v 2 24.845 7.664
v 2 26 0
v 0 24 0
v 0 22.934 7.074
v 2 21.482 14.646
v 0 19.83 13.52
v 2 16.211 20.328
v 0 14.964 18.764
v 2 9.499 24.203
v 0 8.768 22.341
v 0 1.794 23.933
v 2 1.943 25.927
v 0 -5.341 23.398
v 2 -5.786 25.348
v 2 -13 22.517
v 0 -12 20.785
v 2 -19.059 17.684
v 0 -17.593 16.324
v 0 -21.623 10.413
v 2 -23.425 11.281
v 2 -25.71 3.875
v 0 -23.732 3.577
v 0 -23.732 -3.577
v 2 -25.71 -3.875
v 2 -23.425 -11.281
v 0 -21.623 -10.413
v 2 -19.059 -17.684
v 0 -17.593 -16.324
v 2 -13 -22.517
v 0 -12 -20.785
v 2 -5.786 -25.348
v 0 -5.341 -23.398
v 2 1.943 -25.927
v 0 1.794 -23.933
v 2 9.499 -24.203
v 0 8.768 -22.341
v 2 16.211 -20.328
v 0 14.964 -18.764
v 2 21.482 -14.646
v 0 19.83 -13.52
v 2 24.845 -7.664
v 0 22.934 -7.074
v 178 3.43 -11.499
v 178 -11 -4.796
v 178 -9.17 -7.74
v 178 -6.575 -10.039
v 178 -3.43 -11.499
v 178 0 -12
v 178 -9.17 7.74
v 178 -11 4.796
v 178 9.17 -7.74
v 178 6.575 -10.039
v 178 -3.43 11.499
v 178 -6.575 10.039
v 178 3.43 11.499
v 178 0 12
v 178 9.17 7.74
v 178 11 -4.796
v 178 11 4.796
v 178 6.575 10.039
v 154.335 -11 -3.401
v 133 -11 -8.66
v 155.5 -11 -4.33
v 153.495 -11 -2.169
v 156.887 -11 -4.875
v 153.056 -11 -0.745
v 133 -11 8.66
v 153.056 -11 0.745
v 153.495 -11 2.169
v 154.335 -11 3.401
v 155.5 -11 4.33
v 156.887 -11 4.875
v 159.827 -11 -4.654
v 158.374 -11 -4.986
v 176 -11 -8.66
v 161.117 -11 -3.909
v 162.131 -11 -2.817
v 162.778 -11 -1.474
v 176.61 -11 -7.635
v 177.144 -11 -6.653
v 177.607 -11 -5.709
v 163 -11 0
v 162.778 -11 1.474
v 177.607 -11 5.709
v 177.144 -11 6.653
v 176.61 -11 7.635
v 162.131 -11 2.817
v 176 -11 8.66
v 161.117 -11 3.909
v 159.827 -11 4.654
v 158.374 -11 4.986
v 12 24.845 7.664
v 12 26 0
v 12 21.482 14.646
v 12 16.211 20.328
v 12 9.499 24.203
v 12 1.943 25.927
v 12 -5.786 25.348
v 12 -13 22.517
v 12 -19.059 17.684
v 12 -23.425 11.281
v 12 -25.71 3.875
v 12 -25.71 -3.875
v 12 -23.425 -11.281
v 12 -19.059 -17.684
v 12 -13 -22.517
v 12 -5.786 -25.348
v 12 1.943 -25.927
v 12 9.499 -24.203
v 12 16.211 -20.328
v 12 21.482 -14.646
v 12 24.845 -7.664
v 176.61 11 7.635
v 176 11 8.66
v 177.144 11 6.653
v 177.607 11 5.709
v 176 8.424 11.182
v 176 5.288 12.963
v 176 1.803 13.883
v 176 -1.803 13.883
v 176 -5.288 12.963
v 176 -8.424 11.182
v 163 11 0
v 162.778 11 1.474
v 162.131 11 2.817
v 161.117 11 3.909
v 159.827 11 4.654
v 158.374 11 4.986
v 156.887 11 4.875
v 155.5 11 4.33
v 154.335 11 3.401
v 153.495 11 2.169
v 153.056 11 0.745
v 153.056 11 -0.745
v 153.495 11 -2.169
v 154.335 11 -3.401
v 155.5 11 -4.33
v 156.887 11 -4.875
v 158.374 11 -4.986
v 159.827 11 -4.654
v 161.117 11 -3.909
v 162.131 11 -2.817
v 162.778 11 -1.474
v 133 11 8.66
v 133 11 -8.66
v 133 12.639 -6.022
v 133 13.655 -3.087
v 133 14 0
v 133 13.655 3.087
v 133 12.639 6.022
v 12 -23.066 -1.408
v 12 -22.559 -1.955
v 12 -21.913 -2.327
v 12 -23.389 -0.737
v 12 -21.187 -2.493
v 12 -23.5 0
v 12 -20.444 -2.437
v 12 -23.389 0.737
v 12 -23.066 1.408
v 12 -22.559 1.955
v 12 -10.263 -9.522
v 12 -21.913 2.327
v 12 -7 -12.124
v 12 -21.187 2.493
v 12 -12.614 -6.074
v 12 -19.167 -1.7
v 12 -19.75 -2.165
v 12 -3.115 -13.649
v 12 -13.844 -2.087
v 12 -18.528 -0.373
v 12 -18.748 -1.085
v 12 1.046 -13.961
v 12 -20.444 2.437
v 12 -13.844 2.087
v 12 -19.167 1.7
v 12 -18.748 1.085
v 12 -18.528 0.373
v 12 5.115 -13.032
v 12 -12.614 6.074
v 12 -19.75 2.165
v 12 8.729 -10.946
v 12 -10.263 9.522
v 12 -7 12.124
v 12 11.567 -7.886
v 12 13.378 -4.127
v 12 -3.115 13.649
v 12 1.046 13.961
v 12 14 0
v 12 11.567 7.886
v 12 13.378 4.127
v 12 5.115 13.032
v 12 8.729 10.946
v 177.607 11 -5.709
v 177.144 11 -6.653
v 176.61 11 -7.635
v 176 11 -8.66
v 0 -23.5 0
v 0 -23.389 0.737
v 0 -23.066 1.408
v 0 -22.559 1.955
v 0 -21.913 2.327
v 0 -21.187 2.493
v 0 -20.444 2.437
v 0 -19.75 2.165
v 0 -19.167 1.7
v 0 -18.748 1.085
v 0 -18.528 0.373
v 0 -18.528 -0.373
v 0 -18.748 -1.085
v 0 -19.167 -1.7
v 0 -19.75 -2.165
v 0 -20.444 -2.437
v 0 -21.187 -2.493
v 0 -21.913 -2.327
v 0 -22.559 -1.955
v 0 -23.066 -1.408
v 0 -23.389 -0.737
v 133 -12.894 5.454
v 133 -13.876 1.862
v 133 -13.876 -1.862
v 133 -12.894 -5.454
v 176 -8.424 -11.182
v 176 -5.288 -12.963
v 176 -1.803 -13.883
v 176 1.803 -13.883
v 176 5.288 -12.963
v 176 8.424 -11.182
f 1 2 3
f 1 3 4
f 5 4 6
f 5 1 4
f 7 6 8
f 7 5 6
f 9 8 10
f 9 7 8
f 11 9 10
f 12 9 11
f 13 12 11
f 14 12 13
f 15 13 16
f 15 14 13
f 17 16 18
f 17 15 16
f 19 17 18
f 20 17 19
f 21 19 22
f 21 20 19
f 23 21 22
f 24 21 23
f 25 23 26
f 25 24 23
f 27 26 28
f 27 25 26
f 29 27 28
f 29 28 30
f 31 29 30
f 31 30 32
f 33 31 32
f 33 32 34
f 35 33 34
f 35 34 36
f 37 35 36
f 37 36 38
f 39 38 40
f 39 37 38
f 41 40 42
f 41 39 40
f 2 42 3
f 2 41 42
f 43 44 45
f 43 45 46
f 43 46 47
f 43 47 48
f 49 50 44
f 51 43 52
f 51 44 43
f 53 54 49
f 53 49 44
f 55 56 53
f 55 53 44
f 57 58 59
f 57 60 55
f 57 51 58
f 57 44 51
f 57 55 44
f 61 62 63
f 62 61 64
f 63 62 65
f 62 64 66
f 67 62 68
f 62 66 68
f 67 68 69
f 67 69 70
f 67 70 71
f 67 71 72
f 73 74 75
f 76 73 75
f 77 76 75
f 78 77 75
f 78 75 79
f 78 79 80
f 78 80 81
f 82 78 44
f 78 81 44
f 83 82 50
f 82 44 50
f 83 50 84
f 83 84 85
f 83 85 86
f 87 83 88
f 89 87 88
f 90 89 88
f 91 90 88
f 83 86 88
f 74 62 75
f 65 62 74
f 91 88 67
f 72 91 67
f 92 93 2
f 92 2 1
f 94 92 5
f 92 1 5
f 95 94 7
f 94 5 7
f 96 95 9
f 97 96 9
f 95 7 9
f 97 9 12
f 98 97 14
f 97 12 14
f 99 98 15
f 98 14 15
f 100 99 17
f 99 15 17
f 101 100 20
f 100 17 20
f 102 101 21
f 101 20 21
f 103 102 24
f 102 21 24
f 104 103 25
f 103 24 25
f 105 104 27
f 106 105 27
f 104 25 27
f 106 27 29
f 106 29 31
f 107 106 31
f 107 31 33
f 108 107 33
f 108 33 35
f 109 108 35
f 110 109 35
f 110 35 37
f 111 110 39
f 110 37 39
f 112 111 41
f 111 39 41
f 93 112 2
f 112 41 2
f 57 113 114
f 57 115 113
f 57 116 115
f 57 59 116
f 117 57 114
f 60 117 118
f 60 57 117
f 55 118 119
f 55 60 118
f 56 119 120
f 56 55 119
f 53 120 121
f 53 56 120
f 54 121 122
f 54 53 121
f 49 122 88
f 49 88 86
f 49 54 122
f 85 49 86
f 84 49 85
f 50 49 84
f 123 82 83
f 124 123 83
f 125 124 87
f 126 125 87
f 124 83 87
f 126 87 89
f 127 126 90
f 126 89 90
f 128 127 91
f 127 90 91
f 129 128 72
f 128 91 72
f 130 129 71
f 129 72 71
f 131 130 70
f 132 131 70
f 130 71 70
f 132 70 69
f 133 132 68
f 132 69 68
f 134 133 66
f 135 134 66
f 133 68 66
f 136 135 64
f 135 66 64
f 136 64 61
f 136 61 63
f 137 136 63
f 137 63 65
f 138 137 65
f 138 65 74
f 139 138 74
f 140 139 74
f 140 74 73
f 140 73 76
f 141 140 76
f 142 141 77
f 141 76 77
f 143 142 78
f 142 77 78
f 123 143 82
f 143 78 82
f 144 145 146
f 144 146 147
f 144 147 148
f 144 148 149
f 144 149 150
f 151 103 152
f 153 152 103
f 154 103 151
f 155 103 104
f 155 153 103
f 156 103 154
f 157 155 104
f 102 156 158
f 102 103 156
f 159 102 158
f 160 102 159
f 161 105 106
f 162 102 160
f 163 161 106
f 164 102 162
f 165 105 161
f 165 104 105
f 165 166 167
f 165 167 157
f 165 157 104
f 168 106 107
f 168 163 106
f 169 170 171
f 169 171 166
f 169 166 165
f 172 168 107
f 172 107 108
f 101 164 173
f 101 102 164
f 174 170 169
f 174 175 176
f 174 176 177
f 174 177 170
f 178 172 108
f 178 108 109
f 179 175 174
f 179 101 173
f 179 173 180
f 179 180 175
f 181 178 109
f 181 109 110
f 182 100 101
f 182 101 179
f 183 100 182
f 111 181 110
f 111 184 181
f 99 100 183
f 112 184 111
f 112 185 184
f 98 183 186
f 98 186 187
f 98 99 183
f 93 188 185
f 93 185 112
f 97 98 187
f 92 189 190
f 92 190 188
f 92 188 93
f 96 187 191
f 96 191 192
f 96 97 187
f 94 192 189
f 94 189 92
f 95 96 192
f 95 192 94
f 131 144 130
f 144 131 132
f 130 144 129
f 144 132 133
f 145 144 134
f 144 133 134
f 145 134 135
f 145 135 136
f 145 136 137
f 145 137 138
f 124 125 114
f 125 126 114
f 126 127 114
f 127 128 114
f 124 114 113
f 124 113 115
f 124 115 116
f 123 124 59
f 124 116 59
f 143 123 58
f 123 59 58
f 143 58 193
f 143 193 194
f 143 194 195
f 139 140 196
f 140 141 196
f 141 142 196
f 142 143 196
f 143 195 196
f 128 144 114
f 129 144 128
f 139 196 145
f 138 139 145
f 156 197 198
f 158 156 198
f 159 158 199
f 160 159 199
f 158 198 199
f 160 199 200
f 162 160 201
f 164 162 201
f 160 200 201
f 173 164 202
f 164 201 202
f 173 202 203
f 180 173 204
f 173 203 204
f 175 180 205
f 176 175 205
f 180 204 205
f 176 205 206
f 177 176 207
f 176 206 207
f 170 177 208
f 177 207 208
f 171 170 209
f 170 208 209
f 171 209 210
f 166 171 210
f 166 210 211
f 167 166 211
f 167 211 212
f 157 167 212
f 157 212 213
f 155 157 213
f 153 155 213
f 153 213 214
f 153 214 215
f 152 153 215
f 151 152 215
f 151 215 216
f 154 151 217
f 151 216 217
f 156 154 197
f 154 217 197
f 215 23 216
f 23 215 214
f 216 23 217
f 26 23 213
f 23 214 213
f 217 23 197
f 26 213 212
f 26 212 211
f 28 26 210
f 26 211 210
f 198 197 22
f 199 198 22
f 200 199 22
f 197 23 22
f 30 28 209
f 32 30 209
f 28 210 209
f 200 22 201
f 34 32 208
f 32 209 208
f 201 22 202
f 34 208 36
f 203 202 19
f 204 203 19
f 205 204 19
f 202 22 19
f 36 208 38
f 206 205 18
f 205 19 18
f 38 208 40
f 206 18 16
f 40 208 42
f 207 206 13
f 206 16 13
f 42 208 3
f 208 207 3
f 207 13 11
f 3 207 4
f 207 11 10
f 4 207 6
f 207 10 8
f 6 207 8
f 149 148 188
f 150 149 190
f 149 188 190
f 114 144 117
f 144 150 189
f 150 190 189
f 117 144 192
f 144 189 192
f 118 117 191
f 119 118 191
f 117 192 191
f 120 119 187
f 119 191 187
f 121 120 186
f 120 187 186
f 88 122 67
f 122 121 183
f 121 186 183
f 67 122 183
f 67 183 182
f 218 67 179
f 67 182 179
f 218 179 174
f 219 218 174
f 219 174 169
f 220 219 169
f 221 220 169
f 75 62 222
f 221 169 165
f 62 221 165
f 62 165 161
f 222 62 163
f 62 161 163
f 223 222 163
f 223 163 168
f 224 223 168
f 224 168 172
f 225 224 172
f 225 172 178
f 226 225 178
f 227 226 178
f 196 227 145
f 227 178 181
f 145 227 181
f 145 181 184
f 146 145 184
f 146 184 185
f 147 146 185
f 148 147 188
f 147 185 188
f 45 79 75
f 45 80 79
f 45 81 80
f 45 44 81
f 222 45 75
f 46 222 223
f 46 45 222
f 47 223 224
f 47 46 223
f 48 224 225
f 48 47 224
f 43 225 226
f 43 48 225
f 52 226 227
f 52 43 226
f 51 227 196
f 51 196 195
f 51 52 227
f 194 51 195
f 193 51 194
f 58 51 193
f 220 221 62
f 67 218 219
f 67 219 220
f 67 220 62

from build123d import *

# Parameters (mm, degrees)
F0_R     = 26
F0_R_2   = 14
F1_DEPTH = 12
F2_DEPTH = 178
F3_SIZE  = 2
F4_R     = 2.5
F5_DEPTH = 12
F7_DEPTH = 45
F8_R     = 5
F9_DEPTH = 22


with BuildPart() as f1:
    # F0 (on Right) → F1 (new body)
    with BuildSketch(Plane.YZ):
        Circle(F0_R)
        Circle(F0_R_2, mode=Mode.SUBTRACT)
        Circle(F0_R_2)
    extrude(amount=F1_DEPTH)

    # F0 (on Right) → F2 (join)
    with BuildSketch(Plane.YZ):
        Circle(F0_R_2)
    extrude(amount=F2_DEPTH)

    # F3
    f3_edges = [f1.edges().sort_by_distance(p)[0] for p in [
        (0, -26, 0),
        (178, -14, 0),
    ]]
    chamfer(f3_edges, length=F3_SIZE)

    # F4 (on face) → F5 (cut, through all)
    with BuildSketch(Plane(origin=(0, 0, 0), x_dir=(0, -1, 0), z_dir=(-1, 0, 0))):
        with Locations((21, 0)):
            Circle(F4_R)
    extrude(amount=-F5_DEPTH, mode=Mode.SUBTRACT)

    # F6 (on face) → F7 (cut)
    with BuildSketch(Plane.YZ.offset(178)):
        with BuildLine():
            Line((-11, 4.7958315233), (-11, 8.6602540378))
            ThreePointArc((-11, 8.6602540378), (-14, 0), (-11, -8.6602540378))
            Line((-11, -8.6602540378), (-11, -4.7958315233))
            ThreePointArc((-11, -4.7958315233), (-12, 0), (-11, 4.7958315233))
        make_face()
        with BuildLine():
            Line((-11, -4.7958315233), (-11, 4.7958315233))
            ThreePointArc((-11, 4.7958315233), (-12, 0), (-11, -4.7958315233))
        make_face()
        with BuildLine():
            ThreePointArc((12, 0), (11.7473401245, 2.4494897428), (11, 4.7958315233))
            Line((11, 4.7958315233), (11, -4.7958315233))
            ThreePointArc((11, -4.7958315233), (11.7473401245, -2.4494897428), (12, 0))
        make_face()
        with BuildLine():
            ThreePointArc((11, -8.6602540378), (13.2287565553, -4.582575695), (14, 0))
            ThreePointArc((14, 0), (13.2287565553, 4.582575695), (11, 8.6602540378))
            Line((11, 8.6602540378), (11, 4.7958315233))
            ThreePointArc((11, 4.7958315233), (11.7473401245, 2.4494897428), (12, 0))
            ThreePointArc((12, 0), (11.7473401245, -2.4494897428), (11, -4.7958315233))
            Line((11, -4.7958315233), (11, -8.6602540378))
        make_face()
    extrude(amount=-F7_DEPTH, mode=Mode.SUBTRACT)

    # F8 (on face) → F9 (cut, through all)
    with BuildSketch(Plane.XZ.offset(11)):
        with Locations((158, 0)):
            Circle(F8_R)
    extrude(amount=-F9_DEPTH, mode=Mode.SUBTRACT)


solid = f1.part
